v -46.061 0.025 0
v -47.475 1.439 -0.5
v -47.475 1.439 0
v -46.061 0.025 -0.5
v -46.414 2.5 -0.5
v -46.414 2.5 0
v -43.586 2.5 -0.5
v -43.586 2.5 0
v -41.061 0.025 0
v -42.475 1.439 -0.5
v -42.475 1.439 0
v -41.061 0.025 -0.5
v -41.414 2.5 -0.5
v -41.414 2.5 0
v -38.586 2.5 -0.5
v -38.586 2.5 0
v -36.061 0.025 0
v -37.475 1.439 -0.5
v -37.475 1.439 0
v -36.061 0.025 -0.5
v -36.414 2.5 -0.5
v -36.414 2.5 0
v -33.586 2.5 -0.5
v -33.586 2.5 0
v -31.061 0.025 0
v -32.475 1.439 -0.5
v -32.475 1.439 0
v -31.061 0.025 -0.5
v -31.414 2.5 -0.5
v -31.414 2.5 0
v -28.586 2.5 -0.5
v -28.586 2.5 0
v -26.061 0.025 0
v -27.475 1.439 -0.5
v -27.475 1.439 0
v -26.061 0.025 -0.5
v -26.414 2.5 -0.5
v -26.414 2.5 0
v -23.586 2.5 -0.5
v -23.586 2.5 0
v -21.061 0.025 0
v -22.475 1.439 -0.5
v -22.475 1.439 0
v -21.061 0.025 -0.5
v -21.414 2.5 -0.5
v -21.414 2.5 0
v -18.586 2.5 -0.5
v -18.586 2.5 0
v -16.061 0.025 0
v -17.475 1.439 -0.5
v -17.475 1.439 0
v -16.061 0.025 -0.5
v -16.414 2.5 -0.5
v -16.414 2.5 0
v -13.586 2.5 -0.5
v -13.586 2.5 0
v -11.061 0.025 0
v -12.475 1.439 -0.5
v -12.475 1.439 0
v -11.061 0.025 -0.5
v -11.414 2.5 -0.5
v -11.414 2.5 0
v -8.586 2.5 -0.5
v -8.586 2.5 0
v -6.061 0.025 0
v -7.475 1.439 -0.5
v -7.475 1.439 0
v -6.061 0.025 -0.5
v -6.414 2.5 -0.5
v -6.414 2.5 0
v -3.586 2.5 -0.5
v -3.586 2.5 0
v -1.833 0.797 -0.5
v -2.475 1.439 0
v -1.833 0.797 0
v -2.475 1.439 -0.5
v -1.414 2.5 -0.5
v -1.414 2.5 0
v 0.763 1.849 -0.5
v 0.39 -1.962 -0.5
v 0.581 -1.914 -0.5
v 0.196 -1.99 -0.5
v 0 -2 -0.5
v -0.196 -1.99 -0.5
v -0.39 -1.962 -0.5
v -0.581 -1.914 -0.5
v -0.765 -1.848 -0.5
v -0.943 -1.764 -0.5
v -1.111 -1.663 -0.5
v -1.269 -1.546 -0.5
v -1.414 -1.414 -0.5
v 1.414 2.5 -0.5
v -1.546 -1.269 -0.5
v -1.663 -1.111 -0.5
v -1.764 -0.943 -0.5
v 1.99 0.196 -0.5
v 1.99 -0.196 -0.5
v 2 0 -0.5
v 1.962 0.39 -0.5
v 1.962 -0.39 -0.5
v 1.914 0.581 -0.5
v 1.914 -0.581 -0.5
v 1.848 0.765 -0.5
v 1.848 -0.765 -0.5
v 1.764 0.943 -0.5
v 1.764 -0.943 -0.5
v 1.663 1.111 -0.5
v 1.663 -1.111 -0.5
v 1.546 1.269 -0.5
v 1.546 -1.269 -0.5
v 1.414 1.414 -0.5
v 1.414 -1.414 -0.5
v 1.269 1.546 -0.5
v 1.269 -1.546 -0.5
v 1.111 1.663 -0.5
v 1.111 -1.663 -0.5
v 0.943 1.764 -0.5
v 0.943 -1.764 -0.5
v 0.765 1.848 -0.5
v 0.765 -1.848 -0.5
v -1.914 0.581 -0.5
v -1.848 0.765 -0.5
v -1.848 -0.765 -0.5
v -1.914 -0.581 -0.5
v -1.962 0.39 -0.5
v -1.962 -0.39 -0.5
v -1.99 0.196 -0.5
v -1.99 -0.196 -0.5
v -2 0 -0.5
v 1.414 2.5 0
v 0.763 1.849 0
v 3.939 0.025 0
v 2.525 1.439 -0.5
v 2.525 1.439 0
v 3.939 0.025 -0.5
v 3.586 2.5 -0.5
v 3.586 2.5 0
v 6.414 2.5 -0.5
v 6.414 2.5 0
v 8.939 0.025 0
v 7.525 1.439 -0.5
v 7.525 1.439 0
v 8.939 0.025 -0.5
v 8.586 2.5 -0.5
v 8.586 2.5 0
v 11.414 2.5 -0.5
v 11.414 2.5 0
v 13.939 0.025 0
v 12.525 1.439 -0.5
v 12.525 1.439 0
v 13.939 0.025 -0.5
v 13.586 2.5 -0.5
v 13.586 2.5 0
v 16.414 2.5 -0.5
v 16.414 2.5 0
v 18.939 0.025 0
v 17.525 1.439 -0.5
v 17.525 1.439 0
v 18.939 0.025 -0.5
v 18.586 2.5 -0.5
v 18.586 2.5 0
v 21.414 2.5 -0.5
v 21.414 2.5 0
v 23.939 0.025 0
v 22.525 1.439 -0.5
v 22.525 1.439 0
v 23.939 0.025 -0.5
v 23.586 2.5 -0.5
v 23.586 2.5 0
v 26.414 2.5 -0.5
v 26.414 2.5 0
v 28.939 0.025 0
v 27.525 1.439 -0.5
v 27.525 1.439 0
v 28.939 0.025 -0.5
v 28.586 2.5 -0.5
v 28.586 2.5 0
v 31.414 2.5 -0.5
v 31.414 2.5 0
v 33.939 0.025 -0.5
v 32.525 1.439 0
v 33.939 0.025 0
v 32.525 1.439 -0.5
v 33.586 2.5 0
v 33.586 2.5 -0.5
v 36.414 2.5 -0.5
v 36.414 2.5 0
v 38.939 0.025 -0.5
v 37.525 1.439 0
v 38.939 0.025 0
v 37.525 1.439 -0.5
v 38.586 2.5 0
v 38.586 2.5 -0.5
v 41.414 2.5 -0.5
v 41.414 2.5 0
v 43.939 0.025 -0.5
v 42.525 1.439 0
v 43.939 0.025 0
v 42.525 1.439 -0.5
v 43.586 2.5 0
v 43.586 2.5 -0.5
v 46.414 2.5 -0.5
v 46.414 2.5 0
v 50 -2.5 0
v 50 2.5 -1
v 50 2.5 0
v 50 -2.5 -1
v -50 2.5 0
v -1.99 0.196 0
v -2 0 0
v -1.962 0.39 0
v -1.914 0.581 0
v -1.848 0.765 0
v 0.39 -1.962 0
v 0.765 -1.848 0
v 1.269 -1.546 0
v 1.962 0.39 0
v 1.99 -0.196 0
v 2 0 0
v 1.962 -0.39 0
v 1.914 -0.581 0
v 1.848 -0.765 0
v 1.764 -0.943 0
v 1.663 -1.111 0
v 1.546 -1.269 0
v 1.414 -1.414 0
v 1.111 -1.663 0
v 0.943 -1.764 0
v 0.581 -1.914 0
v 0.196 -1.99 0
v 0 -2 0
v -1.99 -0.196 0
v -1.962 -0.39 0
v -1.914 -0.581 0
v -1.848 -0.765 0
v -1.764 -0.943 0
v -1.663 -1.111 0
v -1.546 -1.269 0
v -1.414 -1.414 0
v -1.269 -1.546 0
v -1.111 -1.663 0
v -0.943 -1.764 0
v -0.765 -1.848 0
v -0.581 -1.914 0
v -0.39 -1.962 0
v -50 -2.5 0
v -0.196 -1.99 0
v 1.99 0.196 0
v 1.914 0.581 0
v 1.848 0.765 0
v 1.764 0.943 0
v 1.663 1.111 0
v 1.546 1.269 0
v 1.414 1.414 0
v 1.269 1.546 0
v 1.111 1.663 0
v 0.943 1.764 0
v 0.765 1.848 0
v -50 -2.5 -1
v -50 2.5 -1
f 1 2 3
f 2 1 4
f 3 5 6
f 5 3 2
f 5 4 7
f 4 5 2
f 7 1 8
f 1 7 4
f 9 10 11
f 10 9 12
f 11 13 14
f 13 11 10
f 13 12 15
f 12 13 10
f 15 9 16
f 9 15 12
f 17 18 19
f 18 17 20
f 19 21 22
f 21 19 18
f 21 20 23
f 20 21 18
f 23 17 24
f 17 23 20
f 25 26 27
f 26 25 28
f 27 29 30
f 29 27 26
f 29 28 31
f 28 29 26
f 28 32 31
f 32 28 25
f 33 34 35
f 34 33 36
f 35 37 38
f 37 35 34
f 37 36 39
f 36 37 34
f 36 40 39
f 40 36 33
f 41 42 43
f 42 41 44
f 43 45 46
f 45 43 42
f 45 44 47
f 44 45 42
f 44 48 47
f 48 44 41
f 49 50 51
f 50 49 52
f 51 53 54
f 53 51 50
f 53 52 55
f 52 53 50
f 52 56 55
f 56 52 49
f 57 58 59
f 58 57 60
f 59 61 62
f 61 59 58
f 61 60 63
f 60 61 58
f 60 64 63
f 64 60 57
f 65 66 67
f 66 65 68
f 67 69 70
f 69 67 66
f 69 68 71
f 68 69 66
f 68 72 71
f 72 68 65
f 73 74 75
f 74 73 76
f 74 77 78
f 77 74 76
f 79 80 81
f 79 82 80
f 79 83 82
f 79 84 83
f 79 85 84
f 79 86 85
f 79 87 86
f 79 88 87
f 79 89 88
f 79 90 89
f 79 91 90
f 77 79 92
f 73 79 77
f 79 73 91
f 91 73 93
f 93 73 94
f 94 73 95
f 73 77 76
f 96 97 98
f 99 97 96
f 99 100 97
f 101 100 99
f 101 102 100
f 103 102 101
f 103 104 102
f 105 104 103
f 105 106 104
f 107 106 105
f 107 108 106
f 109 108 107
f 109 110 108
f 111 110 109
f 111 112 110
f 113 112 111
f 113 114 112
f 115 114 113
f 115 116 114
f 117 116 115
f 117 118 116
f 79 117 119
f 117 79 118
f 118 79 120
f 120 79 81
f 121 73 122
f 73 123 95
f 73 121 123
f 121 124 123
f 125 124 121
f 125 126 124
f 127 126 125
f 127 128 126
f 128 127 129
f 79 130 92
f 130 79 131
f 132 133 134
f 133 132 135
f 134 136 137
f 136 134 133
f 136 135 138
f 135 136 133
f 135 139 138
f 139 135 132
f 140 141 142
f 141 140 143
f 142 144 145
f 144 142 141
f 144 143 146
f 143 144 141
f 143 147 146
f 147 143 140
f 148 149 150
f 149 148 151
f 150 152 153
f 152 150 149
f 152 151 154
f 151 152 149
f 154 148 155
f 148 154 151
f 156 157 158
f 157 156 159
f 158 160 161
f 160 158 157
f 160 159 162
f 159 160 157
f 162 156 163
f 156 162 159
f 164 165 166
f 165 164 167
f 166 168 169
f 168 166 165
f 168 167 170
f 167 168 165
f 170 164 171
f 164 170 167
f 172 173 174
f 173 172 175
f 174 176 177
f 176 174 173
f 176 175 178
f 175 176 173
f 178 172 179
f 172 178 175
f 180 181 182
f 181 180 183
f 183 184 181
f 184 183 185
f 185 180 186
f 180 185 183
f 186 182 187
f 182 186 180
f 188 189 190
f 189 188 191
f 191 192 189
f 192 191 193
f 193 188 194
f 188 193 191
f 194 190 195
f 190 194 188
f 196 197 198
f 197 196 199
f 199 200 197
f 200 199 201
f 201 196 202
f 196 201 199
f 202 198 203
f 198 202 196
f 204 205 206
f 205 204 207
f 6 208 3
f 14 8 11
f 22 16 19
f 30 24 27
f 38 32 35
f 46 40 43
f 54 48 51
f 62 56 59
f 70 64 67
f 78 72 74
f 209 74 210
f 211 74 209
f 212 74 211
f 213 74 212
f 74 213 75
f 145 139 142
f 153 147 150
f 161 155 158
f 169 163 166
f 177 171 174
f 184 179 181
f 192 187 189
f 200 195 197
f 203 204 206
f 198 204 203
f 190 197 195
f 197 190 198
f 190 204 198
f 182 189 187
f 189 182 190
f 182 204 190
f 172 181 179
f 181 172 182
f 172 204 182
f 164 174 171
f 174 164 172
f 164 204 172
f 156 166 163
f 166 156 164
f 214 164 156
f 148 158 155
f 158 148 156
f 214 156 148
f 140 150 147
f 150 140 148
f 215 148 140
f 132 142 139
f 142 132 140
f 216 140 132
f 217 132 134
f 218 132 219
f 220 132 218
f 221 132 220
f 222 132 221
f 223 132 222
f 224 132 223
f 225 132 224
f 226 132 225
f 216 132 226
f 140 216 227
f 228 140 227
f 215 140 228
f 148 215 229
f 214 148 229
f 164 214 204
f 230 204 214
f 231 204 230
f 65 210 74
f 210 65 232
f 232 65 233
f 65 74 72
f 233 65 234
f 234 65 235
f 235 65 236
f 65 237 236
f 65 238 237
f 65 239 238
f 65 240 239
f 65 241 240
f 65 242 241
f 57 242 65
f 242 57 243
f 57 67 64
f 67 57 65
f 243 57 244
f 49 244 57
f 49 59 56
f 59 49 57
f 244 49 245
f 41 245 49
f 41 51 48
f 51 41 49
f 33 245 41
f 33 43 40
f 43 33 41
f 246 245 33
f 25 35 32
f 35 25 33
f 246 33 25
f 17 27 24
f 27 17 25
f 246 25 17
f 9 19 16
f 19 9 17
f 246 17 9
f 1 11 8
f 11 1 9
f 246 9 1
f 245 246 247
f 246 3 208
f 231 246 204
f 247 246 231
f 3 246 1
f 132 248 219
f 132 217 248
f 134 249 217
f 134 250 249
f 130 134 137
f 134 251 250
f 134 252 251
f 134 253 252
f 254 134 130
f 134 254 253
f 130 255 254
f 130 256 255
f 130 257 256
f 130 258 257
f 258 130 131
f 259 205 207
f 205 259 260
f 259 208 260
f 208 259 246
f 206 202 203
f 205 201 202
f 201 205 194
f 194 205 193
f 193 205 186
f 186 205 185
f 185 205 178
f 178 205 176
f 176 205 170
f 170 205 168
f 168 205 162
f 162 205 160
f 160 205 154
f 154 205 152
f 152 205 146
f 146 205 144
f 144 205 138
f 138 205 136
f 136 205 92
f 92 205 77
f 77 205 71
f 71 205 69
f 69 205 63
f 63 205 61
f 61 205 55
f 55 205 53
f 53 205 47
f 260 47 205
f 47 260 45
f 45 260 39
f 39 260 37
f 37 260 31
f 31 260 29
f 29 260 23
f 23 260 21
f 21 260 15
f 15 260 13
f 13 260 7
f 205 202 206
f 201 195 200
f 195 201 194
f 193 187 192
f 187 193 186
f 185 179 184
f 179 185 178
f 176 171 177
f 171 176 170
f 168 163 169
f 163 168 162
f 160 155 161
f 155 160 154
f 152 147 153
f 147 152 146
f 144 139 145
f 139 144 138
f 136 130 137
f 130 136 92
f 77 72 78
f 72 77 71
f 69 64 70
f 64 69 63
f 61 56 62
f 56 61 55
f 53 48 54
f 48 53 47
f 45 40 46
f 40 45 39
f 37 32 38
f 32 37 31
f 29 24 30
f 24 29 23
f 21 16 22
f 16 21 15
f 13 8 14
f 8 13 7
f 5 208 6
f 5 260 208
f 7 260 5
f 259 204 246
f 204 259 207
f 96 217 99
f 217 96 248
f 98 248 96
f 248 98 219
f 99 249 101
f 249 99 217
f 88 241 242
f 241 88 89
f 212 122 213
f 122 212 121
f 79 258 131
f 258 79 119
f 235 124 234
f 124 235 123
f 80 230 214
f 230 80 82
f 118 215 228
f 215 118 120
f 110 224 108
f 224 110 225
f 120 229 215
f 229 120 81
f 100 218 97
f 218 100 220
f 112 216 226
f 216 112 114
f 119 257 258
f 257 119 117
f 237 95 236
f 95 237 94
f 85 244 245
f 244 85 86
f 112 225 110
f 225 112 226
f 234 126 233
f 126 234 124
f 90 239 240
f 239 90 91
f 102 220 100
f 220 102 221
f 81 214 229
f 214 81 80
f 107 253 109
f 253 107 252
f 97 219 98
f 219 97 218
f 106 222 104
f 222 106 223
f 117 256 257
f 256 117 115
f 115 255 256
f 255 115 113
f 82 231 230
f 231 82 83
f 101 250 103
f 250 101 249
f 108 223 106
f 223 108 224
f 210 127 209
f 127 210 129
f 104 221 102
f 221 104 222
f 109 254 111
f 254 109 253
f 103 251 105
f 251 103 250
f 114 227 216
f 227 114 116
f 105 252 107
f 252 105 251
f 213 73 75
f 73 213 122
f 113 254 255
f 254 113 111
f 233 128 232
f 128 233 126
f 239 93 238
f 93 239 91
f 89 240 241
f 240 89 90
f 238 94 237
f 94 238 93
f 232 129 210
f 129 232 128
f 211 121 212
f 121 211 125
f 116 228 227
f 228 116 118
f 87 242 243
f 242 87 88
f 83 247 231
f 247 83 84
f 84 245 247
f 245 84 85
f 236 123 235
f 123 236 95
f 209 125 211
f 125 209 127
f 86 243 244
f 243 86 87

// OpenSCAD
module saw_blade() {
    difference() {
        // Main blade body
        translate([0, 0, -0.5])
        cube([100, 5, 1], center=true);
        
        // Teeth
        for (i = [-45:5:45]) {
            translate([i, 2.5, 0])
            rotate([0, 0, 45])
            cube([5, 2, 1], center=true);
        }
        
        // Hole for mounting
        translate([0, 0, -0.5])
        cylinder(h=2, r=2, $fn=64);
    }
}

saw_blade();
